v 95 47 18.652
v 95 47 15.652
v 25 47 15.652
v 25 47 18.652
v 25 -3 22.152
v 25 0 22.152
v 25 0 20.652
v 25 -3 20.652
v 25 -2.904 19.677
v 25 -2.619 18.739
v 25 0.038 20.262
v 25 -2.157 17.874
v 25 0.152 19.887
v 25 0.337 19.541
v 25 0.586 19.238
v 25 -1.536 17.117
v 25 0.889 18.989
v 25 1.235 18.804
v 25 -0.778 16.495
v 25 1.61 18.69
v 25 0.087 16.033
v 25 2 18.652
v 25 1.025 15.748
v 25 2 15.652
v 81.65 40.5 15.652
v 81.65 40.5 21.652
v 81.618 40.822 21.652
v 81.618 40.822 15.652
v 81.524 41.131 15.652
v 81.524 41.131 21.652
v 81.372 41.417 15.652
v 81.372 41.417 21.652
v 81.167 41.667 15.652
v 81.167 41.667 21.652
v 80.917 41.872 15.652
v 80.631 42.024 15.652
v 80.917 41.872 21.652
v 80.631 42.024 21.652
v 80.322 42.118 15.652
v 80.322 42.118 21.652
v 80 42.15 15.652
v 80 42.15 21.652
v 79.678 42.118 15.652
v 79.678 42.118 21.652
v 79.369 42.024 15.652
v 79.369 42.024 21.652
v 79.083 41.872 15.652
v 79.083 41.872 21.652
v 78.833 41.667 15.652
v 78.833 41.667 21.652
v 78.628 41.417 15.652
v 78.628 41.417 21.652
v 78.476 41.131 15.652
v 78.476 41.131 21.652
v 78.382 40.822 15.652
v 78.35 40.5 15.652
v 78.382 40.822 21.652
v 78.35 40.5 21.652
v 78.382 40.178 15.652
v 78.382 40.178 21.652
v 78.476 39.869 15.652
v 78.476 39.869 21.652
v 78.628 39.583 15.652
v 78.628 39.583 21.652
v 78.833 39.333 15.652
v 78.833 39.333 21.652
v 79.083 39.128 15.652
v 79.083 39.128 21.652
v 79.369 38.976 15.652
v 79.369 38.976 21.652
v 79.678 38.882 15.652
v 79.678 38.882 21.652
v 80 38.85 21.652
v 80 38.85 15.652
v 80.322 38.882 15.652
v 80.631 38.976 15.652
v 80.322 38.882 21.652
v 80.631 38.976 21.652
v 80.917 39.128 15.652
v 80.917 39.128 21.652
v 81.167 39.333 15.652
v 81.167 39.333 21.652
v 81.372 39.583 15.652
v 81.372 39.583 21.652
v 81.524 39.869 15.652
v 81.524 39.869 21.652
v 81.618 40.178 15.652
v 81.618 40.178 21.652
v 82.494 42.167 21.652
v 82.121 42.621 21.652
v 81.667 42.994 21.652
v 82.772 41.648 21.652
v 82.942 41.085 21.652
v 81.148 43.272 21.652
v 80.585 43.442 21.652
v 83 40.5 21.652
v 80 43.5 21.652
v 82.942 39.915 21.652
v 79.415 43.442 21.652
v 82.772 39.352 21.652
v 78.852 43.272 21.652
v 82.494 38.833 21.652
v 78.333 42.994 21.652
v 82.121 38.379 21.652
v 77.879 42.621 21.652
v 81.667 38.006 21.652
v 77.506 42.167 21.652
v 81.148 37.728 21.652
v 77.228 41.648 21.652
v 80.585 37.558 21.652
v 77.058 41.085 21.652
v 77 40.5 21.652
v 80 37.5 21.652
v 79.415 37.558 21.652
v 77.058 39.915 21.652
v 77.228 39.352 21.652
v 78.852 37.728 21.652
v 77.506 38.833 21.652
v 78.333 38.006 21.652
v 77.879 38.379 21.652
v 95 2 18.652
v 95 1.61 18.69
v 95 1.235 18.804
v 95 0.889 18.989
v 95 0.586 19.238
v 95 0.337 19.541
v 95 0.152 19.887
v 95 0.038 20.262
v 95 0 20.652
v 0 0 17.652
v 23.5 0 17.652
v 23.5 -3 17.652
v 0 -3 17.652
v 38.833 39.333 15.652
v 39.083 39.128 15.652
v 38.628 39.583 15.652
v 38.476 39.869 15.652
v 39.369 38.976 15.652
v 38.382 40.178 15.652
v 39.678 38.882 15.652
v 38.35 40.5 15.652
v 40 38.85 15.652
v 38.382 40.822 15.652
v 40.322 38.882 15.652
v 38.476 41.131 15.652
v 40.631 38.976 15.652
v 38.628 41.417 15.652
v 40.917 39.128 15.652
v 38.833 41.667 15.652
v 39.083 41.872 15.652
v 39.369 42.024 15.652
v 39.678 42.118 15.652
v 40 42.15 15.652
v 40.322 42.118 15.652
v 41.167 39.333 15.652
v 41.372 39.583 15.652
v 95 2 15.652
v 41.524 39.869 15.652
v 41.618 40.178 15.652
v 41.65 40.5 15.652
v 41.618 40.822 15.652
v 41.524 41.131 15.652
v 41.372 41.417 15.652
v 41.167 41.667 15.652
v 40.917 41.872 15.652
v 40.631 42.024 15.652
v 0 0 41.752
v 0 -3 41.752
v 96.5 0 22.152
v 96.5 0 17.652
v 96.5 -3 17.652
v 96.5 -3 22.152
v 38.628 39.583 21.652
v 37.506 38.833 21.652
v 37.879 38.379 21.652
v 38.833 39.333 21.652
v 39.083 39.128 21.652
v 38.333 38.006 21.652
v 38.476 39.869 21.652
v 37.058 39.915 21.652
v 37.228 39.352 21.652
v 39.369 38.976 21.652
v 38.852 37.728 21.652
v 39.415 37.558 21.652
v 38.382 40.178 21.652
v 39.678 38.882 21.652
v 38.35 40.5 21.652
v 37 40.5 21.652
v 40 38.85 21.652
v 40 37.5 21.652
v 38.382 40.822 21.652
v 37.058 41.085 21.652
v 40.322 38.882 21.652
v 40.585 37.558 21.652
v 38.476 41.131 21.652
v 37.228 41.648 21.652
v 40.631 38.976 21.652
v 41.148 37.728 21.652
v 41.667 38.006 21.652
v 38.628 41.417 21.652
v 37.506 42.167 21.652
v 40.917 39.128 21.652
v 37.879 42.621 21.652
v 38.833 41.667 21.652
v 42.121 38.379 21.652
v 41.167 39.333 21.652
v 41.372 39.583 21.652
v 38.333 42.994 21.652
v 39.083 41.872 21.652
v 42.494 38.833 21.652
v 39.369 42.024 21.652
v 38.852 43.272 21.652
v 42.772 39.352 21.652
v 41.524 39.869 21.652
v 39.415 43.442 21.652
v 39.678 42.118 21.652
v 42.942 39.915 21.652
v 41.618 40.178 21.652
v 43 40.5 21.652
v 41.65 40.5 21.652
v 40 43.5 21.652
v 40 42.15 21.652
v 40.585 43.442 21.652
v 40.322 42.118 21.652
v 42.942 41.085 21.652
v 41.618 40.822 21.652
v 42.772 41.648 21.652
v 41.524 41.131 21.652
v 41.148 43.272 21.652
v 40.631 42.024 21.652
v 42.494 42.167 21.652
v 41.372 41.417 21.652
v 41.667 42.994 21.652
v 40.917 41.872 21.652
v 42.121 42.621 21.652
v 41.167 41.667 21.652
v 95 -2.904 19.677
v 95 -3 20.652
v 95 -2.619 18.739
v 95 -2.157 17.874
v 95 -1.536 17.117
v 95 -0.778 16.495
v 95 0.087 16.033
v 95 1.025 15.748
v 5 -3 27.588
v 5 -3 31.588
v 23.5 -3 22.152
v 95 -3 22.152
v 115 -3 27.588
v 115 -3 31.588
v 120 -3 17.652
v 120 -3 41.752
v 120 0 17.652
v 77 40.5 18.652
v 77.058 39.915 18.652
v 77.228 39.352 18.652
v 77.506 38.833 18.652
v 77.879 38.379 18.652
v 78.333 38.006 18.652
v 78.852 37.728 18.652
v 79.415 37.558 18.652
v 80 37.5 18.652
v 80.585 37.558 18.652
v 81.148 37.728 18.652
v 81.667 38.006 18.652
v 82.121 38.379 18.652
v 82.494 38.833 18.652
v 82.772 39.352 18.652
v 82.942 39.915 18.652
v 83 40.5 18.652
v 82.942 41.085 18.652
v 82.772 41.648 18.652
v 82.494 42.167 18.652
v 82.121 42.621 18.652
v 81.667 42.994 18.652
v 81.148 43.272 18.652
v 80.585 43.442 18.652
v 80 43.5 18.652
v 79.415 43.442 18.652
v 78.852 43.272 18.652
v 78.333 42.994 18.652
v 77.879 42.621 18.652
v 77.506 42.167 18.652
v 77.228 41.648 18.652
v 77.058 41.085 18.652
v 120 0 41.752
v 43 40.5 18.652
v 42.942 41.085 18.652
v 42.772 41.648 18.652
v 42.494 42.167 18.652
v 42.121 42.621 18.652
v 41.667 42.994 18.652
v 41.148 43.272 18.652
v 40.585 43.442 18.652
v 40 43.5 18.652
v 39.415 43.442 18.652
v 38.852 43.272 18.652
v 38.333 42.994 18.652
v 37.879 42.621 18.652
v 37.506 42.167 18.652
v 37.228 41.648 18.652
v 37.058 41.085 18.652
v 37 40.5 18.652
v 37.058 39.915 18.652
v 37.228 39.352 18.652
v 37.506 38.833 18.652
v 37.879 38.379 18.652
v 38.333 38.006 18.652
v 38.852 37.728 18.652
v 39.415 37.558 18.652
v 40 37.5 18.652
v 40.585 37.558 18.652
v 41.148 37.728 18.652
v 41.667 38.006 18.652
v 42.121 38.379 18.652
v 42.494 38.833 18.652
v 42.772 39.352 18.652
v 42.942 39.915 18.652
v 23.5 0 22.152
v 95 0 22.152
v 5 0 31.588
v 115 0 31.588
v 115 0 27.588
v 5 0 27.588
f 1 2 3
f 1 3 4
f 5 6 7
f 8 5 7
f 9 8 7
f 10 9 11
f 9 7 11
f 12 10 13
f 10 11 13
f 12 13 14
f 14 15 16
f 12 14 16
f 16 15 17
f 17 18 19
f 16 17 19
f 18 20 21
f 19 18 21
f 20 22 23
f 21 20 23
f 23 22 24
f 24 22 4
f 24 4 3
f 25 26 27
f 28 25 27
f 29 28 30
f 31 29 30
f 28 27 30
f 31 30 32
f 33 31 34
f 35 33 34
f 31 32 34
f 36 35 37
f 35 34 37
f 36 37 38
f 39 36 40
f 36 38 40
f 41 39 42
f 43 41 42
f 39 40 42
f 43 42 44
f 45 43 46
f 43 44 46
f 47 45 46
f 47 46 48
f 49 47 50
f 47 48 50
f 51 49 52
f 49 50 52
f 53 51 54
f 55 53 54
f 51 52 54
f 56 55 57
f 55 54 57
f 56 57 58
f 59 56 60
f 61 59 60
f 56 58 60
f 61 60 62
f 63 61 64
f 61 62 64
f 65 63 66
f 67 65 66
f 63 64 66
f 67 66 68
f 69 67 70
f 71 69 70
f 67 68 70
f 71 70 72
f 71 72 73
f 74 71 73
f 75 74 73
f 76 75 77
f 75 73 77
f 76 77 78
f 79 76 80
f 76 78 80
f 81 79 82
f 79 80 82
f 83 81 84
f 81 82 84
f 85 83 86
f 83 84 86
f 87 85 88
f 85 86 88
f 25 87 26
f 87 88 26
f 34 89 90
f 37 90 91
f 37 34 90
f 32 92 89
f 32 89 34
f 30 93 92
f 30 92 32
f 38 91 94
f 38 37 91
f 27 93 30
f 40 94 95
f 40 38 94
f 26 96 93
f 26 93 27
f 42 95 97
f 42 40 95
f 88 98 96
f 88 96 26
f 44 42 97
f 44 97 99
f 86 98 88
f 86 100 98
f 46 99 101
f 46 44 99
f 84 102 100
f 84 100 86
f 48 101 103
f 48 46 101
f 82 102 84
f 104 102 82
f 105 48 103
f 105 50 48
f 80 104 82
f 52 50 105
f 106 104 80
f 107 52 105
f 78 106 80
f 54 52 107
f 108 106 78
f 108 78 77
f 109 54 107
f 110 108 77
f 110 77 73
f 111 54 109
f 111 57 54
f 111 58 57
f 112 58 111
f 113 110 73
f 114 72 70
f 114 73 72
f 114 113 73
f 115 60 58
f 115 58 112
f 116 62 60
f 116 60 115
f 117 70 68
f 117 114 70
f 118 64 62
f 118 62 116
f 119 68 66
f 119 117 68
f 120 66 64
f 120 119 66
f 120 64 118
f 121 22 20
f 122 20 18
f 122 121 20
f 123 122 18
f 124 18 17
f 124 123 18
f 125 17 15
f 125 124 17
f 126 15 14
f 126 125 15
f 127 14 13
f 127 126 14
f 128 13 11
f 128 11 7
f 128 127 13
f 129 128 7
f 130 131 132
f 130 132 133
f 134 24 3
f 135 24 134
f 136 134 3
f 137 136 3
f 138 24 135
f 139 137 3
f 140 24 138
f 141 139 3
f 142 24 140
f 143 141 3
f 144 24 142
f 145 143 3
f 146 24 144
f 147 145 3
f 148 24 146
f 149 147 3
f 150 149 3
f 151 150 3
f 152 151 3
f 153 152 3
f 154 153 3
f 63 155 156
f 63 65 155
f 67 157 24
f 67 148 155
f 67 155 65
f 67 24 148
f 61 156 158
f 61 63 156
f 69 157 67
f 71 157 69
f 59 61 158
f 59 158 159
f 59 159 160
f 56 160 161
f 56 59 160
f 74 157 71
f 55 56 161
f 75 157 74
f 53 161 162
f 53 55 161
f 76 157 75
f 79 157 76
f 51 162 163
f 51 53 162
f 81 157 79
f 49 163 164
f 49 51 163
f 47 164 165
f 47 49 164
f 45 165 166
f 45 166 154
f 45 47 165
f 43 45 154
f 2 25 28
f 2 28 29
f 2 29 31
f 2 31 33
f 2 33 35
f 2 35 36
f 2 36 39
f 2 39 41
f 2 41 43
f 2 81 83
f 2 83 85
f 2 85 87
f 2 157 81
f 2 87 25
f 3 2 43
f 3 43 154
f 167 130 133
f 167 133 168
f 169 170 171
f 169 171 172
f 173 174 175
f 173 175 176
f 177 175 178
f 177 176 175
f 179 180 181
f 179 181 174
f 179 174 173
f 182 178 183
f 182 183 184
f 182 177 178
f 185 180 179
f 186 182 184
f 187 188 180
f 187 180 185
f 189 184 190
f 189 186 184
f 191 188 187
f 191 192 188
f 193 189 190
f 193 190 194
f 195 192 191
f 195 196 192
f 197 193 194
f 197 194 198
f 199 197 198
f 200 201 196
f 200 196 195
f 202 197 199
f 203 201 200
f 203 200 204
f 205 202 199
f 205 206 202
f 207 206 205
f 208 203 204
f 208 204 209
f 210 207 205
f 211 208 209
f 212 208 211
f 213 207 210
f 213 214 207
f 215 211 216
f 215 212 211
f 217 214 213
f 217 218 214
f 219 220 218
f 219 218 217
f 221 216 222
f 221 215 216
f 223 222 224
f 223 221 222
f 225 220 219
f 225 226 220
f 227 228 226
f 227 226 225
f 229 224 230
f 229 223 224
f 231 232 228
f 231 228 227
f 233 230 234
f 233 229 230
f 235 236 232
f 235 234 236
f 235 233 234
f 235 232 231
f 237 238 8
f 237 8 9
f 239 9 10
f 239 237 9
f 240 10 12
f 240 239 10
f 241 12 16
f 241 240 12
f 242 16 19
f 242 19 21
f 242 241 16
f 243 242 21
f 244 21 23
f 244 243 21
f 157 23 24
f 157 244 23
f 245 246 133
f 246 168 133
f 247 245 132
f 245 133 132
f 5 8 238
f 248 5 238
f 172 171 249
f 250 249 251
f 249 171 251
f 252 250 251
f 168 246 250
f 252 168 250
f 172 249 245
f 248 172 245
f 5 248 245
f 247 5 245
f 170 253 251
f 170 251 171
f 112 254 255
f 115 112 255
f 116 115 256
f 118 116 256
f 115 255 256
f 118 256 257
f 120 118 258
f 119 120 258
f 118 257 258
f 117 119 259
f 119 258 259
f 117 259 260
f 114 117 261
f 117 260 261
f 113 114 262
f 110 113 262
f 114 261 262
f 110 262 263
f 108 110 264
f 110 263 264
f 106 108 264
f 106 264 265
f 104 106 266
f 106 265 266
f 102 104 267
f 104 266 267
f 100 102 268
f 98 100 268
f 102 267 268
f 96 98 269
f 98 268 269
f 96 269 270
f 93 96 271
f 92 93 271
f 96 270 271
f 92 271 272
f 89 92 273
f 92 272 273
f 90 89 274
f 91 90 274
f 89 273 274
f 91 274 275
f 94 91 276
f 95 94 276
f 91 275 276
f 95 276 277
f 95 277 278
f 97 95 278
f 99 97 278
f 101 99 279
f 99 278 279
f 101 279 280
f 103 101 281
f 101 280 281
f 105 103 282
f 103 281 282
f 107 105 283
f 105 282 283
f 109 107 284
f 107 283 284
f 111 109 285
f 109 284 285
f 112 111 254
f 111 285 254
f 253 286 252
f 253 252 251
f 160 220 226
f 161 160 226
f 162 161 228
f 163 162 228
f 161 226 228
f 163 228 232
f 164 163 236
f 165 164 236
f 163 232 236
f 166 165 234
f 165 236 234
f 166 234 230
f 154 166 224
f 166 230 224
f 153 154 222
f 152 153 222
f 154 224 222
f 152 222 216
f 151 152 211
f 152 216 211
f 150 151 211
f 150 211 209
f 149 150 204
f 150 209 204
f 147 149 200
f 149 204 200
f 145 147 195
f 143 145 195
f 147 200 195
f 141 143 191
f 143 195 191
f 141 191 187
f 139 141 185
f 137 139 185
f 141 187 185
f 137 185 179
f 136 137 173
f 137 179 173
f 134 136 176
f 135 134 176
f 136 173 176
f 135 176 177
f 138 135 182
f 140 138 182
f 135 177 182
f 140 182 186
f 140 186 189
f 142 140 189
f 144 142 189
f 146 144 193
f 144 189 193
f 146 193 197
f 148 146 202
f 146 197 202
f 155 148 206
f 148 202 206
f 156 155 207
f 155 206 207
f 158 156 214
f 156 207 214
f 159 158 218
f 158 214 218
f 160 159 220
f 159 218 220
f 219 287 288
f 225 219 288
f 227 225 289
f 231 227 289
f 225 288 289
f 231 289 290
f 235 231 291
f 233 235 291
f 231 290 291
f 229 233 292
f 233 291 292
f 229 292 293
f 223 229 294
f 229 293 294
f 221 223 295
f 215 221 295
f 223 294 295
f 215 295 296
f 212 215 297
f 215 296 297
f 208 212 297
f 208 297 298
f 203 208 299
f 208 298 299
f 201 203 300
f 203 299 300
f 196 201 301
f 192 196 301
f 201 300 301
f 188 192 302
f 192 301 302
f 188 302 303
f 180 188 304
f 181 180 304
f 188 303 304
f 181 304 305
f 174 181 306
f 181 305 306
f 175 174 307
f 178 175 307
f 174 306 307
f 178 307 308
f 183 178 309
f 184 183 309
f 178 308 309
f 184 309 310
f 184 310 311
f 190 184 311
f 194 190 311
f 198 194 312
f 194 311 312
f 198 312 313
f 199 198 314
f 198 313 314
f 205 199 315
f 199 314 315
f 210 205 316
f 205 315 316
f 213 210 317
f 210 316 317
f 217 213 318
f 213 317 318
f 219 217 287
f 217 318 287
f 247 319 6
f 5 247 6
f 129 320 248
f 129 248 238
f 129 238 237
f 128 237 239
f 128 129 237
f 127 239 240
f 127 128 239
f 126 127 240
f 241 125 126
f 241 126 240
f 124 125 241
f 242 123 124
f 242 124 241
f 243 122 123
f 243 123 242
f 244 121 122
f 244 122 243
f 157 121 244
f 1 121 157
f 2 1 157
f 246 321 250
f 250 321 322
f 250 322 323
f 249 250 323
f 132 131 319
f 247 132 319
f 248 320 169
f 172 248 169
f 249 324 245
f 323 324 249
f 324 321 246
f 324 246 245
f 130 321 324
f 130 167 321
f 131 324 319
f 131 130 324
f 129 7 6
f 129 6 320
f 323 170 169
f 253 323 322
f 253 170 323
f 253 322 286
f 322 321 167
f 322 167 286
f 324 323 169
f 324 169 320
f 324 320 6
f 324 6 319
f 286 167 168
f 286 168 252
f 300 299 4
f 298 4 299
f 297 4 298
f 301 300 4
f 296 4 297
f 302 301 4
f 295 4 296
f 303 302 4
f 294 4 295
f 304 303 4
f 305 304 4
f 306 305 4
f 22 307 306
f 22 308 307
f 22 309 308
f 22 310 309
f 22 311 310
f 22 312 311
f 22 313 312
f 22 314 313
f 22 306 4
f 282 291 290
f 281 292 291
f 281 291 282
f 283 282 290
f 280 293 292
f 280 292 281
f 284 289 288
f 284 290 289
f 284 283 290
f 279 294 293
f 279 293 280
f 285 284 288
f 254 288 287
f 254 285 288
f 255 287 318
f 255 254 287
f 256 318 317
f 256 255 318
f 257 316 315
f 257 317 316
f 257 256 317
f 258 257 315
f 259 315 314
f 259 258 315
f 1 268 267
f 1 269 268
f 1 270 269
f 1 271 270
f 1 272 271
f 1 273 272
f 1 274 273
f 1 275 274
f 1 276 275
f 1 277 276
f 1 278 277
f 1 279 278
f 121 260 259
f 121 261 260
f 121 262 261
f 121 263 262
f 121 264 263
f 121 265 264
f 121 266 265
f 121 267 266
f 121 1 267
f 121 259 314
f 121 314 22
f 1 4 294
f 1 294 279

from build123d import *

# Parameters (mm, degrees)
SM_BASE_FLANGE_2_DEPTH            = 3
SM_EDGE_FLANGE_2_STRIP_W          = 16
SM_EDGE_FLANGE_2_STRIP_H          = 3
SM_EDGE_FLANGE_2_STRIP_CUT_DEPTH  = 70
SM_EDGE_FLANGE_2_RELIEF_W         = 17.5
SM_EDGE_FLANGE_2_RELIEF_H         = 1.5
SM_EDGE_FLANGE_2_RELIEF_CUT_DEPTH = 3
SM_EDGE_FLANGE_2_DEPTH            = 70
SKETCH_21_W                       = 110
SKETCH_21_H                       = 4
CUT_EXTRUDE_1_DEPTH               = 30
SKETCH_23_R                       = 3
EXTRUDE_1_DEPTH                   = 3
SKETCH_24_R                       = 1.65
CUT_EXTRUDE_2_DEPTH               = 6


# Sheet-metal steps are written as plain solids
with BuildPart() as part:
    # 草图15 → 基体-法兰2 (new body)
    with BuildSketch(Plane(origin=(0, 0, 0), x_dir=(1, 0, 0), z_dir=(0, 1, 0))):
        Polygon((0, -41.752065), (120, -41.752065), (120, -17.652065), (95, -17.652065), (95, -15.652065), (25, -15.652065), (25, -17.652065), (0, -17.652065), align=None)
    extrude(amount=-SM_BASE_FLANGE_2_DEPTH)

    # 边线-法兰2 strip (across the edge) → 边线-法兰2 strip cut (cut)
    with BuildSketch(Plane(origin=(95, 0, 15.652065), x_dir=(0, 0, 1), z_dir=(-1, 0, 0))):
        with Locations((-3, -1.5)):
            Rectangle(SM_EDGE_FLANGE_2_STRIP_W, SM_EDGE_FLANGE_2_STRIP_H)
    extrude(amount=SM_EDGE_FLANGE_2_STRIP_CUT_DEPTH, mode=Mode.SUBTRACT)

    # 边线-法兰2 relief (on the sheet) → 边线-法兰2 relief cut (cut)
    with BuildSketch(Plane(origin=(95, 0, 20.652065), x_dir=(0, 0, 1), z_dir=(0, 1, 0))):
        with Locations((-7.25, 0.75)):
            Rectangle(SM_EDGE_FLANGE_2_RELIEF_W, SM_EDGE_FLANGE_2_RELIEF_H)
        with Locations((-7.25, -70.75)):
            Rectangle(SM_EDGE_FLANGE_2_RELIEF_W, SM_EDGE_FLANGE_2_RELIEF_H)
    extrude(amount=-SM_EDGE_FLANGE_2_RELIEF_CUT_DEPTH, mode=Mode.SUBTRACT)

    # 边线-法兰2 section (across the edge) → 边线-法兰2 (add)
    with BuildSketch(Plane(origin=(95, 0, 15.652065), x_dir=(0, 0, 1), z_dir=(-1, 0, 0))):
        with BuildLine():
            Line((0, 2), (0, 47))
            Line((0, 47), (3, 47))
            Line((3, 47), (3, 2))
            ThreePointArc((3, 2), (3.585786438, 0.585786438), (5, 0))
            Line((5, 0), (5, -3))
            ThreePointArc((5, -3), (1.464466094, -1.535533906), (0, 2))
        make_face()
    extrude(amount=SM_EDGE_FLANGE_2_DEPTH)

    # 草图21 → 切除-拉伸1 (cut)
    with BuildSketch(Plane(origin=(0, 0, 0), x_dir=(1, 0, 0), z_dir=(0, 1, 0))):
        with Locations((60, -29.58826484)):
            Rectangle(SKETCH_21_W, SKETCH_21_H)
    extrude(amount=-CUT_EXTRUDE_1_DEPTH, mode=Mode.SUBTRACT)

    # 草图23 → 凸台-拉伸1 (add)
    with BuildSketch(Plane.XY.offset(18.652065)):
        with Locations((40, 40.5)):
            Circle(SKETCH_23_R)
        with Locations(Location((80, 40.5, 0), (0, 0, 180))):
            Circle(SKETCH_23_R)
    extrude(amount=EXTRUDE_1_DEPTH)

    # 草图24 → 切除-拉伸2 (cut)
    with BuildSketch(Plane.XY.offset(21.652065)):
        with Locations((40, 40.5)):
            Circle(SKETCH_24_R)
        with Locations((80, 40.5)):
            Circle(SKETCH_24_R)
    extrude(amount=-CUT_EXTRUDE_2_DEPTH, mode=Mode.SUBTRACT)


solid = part.part
